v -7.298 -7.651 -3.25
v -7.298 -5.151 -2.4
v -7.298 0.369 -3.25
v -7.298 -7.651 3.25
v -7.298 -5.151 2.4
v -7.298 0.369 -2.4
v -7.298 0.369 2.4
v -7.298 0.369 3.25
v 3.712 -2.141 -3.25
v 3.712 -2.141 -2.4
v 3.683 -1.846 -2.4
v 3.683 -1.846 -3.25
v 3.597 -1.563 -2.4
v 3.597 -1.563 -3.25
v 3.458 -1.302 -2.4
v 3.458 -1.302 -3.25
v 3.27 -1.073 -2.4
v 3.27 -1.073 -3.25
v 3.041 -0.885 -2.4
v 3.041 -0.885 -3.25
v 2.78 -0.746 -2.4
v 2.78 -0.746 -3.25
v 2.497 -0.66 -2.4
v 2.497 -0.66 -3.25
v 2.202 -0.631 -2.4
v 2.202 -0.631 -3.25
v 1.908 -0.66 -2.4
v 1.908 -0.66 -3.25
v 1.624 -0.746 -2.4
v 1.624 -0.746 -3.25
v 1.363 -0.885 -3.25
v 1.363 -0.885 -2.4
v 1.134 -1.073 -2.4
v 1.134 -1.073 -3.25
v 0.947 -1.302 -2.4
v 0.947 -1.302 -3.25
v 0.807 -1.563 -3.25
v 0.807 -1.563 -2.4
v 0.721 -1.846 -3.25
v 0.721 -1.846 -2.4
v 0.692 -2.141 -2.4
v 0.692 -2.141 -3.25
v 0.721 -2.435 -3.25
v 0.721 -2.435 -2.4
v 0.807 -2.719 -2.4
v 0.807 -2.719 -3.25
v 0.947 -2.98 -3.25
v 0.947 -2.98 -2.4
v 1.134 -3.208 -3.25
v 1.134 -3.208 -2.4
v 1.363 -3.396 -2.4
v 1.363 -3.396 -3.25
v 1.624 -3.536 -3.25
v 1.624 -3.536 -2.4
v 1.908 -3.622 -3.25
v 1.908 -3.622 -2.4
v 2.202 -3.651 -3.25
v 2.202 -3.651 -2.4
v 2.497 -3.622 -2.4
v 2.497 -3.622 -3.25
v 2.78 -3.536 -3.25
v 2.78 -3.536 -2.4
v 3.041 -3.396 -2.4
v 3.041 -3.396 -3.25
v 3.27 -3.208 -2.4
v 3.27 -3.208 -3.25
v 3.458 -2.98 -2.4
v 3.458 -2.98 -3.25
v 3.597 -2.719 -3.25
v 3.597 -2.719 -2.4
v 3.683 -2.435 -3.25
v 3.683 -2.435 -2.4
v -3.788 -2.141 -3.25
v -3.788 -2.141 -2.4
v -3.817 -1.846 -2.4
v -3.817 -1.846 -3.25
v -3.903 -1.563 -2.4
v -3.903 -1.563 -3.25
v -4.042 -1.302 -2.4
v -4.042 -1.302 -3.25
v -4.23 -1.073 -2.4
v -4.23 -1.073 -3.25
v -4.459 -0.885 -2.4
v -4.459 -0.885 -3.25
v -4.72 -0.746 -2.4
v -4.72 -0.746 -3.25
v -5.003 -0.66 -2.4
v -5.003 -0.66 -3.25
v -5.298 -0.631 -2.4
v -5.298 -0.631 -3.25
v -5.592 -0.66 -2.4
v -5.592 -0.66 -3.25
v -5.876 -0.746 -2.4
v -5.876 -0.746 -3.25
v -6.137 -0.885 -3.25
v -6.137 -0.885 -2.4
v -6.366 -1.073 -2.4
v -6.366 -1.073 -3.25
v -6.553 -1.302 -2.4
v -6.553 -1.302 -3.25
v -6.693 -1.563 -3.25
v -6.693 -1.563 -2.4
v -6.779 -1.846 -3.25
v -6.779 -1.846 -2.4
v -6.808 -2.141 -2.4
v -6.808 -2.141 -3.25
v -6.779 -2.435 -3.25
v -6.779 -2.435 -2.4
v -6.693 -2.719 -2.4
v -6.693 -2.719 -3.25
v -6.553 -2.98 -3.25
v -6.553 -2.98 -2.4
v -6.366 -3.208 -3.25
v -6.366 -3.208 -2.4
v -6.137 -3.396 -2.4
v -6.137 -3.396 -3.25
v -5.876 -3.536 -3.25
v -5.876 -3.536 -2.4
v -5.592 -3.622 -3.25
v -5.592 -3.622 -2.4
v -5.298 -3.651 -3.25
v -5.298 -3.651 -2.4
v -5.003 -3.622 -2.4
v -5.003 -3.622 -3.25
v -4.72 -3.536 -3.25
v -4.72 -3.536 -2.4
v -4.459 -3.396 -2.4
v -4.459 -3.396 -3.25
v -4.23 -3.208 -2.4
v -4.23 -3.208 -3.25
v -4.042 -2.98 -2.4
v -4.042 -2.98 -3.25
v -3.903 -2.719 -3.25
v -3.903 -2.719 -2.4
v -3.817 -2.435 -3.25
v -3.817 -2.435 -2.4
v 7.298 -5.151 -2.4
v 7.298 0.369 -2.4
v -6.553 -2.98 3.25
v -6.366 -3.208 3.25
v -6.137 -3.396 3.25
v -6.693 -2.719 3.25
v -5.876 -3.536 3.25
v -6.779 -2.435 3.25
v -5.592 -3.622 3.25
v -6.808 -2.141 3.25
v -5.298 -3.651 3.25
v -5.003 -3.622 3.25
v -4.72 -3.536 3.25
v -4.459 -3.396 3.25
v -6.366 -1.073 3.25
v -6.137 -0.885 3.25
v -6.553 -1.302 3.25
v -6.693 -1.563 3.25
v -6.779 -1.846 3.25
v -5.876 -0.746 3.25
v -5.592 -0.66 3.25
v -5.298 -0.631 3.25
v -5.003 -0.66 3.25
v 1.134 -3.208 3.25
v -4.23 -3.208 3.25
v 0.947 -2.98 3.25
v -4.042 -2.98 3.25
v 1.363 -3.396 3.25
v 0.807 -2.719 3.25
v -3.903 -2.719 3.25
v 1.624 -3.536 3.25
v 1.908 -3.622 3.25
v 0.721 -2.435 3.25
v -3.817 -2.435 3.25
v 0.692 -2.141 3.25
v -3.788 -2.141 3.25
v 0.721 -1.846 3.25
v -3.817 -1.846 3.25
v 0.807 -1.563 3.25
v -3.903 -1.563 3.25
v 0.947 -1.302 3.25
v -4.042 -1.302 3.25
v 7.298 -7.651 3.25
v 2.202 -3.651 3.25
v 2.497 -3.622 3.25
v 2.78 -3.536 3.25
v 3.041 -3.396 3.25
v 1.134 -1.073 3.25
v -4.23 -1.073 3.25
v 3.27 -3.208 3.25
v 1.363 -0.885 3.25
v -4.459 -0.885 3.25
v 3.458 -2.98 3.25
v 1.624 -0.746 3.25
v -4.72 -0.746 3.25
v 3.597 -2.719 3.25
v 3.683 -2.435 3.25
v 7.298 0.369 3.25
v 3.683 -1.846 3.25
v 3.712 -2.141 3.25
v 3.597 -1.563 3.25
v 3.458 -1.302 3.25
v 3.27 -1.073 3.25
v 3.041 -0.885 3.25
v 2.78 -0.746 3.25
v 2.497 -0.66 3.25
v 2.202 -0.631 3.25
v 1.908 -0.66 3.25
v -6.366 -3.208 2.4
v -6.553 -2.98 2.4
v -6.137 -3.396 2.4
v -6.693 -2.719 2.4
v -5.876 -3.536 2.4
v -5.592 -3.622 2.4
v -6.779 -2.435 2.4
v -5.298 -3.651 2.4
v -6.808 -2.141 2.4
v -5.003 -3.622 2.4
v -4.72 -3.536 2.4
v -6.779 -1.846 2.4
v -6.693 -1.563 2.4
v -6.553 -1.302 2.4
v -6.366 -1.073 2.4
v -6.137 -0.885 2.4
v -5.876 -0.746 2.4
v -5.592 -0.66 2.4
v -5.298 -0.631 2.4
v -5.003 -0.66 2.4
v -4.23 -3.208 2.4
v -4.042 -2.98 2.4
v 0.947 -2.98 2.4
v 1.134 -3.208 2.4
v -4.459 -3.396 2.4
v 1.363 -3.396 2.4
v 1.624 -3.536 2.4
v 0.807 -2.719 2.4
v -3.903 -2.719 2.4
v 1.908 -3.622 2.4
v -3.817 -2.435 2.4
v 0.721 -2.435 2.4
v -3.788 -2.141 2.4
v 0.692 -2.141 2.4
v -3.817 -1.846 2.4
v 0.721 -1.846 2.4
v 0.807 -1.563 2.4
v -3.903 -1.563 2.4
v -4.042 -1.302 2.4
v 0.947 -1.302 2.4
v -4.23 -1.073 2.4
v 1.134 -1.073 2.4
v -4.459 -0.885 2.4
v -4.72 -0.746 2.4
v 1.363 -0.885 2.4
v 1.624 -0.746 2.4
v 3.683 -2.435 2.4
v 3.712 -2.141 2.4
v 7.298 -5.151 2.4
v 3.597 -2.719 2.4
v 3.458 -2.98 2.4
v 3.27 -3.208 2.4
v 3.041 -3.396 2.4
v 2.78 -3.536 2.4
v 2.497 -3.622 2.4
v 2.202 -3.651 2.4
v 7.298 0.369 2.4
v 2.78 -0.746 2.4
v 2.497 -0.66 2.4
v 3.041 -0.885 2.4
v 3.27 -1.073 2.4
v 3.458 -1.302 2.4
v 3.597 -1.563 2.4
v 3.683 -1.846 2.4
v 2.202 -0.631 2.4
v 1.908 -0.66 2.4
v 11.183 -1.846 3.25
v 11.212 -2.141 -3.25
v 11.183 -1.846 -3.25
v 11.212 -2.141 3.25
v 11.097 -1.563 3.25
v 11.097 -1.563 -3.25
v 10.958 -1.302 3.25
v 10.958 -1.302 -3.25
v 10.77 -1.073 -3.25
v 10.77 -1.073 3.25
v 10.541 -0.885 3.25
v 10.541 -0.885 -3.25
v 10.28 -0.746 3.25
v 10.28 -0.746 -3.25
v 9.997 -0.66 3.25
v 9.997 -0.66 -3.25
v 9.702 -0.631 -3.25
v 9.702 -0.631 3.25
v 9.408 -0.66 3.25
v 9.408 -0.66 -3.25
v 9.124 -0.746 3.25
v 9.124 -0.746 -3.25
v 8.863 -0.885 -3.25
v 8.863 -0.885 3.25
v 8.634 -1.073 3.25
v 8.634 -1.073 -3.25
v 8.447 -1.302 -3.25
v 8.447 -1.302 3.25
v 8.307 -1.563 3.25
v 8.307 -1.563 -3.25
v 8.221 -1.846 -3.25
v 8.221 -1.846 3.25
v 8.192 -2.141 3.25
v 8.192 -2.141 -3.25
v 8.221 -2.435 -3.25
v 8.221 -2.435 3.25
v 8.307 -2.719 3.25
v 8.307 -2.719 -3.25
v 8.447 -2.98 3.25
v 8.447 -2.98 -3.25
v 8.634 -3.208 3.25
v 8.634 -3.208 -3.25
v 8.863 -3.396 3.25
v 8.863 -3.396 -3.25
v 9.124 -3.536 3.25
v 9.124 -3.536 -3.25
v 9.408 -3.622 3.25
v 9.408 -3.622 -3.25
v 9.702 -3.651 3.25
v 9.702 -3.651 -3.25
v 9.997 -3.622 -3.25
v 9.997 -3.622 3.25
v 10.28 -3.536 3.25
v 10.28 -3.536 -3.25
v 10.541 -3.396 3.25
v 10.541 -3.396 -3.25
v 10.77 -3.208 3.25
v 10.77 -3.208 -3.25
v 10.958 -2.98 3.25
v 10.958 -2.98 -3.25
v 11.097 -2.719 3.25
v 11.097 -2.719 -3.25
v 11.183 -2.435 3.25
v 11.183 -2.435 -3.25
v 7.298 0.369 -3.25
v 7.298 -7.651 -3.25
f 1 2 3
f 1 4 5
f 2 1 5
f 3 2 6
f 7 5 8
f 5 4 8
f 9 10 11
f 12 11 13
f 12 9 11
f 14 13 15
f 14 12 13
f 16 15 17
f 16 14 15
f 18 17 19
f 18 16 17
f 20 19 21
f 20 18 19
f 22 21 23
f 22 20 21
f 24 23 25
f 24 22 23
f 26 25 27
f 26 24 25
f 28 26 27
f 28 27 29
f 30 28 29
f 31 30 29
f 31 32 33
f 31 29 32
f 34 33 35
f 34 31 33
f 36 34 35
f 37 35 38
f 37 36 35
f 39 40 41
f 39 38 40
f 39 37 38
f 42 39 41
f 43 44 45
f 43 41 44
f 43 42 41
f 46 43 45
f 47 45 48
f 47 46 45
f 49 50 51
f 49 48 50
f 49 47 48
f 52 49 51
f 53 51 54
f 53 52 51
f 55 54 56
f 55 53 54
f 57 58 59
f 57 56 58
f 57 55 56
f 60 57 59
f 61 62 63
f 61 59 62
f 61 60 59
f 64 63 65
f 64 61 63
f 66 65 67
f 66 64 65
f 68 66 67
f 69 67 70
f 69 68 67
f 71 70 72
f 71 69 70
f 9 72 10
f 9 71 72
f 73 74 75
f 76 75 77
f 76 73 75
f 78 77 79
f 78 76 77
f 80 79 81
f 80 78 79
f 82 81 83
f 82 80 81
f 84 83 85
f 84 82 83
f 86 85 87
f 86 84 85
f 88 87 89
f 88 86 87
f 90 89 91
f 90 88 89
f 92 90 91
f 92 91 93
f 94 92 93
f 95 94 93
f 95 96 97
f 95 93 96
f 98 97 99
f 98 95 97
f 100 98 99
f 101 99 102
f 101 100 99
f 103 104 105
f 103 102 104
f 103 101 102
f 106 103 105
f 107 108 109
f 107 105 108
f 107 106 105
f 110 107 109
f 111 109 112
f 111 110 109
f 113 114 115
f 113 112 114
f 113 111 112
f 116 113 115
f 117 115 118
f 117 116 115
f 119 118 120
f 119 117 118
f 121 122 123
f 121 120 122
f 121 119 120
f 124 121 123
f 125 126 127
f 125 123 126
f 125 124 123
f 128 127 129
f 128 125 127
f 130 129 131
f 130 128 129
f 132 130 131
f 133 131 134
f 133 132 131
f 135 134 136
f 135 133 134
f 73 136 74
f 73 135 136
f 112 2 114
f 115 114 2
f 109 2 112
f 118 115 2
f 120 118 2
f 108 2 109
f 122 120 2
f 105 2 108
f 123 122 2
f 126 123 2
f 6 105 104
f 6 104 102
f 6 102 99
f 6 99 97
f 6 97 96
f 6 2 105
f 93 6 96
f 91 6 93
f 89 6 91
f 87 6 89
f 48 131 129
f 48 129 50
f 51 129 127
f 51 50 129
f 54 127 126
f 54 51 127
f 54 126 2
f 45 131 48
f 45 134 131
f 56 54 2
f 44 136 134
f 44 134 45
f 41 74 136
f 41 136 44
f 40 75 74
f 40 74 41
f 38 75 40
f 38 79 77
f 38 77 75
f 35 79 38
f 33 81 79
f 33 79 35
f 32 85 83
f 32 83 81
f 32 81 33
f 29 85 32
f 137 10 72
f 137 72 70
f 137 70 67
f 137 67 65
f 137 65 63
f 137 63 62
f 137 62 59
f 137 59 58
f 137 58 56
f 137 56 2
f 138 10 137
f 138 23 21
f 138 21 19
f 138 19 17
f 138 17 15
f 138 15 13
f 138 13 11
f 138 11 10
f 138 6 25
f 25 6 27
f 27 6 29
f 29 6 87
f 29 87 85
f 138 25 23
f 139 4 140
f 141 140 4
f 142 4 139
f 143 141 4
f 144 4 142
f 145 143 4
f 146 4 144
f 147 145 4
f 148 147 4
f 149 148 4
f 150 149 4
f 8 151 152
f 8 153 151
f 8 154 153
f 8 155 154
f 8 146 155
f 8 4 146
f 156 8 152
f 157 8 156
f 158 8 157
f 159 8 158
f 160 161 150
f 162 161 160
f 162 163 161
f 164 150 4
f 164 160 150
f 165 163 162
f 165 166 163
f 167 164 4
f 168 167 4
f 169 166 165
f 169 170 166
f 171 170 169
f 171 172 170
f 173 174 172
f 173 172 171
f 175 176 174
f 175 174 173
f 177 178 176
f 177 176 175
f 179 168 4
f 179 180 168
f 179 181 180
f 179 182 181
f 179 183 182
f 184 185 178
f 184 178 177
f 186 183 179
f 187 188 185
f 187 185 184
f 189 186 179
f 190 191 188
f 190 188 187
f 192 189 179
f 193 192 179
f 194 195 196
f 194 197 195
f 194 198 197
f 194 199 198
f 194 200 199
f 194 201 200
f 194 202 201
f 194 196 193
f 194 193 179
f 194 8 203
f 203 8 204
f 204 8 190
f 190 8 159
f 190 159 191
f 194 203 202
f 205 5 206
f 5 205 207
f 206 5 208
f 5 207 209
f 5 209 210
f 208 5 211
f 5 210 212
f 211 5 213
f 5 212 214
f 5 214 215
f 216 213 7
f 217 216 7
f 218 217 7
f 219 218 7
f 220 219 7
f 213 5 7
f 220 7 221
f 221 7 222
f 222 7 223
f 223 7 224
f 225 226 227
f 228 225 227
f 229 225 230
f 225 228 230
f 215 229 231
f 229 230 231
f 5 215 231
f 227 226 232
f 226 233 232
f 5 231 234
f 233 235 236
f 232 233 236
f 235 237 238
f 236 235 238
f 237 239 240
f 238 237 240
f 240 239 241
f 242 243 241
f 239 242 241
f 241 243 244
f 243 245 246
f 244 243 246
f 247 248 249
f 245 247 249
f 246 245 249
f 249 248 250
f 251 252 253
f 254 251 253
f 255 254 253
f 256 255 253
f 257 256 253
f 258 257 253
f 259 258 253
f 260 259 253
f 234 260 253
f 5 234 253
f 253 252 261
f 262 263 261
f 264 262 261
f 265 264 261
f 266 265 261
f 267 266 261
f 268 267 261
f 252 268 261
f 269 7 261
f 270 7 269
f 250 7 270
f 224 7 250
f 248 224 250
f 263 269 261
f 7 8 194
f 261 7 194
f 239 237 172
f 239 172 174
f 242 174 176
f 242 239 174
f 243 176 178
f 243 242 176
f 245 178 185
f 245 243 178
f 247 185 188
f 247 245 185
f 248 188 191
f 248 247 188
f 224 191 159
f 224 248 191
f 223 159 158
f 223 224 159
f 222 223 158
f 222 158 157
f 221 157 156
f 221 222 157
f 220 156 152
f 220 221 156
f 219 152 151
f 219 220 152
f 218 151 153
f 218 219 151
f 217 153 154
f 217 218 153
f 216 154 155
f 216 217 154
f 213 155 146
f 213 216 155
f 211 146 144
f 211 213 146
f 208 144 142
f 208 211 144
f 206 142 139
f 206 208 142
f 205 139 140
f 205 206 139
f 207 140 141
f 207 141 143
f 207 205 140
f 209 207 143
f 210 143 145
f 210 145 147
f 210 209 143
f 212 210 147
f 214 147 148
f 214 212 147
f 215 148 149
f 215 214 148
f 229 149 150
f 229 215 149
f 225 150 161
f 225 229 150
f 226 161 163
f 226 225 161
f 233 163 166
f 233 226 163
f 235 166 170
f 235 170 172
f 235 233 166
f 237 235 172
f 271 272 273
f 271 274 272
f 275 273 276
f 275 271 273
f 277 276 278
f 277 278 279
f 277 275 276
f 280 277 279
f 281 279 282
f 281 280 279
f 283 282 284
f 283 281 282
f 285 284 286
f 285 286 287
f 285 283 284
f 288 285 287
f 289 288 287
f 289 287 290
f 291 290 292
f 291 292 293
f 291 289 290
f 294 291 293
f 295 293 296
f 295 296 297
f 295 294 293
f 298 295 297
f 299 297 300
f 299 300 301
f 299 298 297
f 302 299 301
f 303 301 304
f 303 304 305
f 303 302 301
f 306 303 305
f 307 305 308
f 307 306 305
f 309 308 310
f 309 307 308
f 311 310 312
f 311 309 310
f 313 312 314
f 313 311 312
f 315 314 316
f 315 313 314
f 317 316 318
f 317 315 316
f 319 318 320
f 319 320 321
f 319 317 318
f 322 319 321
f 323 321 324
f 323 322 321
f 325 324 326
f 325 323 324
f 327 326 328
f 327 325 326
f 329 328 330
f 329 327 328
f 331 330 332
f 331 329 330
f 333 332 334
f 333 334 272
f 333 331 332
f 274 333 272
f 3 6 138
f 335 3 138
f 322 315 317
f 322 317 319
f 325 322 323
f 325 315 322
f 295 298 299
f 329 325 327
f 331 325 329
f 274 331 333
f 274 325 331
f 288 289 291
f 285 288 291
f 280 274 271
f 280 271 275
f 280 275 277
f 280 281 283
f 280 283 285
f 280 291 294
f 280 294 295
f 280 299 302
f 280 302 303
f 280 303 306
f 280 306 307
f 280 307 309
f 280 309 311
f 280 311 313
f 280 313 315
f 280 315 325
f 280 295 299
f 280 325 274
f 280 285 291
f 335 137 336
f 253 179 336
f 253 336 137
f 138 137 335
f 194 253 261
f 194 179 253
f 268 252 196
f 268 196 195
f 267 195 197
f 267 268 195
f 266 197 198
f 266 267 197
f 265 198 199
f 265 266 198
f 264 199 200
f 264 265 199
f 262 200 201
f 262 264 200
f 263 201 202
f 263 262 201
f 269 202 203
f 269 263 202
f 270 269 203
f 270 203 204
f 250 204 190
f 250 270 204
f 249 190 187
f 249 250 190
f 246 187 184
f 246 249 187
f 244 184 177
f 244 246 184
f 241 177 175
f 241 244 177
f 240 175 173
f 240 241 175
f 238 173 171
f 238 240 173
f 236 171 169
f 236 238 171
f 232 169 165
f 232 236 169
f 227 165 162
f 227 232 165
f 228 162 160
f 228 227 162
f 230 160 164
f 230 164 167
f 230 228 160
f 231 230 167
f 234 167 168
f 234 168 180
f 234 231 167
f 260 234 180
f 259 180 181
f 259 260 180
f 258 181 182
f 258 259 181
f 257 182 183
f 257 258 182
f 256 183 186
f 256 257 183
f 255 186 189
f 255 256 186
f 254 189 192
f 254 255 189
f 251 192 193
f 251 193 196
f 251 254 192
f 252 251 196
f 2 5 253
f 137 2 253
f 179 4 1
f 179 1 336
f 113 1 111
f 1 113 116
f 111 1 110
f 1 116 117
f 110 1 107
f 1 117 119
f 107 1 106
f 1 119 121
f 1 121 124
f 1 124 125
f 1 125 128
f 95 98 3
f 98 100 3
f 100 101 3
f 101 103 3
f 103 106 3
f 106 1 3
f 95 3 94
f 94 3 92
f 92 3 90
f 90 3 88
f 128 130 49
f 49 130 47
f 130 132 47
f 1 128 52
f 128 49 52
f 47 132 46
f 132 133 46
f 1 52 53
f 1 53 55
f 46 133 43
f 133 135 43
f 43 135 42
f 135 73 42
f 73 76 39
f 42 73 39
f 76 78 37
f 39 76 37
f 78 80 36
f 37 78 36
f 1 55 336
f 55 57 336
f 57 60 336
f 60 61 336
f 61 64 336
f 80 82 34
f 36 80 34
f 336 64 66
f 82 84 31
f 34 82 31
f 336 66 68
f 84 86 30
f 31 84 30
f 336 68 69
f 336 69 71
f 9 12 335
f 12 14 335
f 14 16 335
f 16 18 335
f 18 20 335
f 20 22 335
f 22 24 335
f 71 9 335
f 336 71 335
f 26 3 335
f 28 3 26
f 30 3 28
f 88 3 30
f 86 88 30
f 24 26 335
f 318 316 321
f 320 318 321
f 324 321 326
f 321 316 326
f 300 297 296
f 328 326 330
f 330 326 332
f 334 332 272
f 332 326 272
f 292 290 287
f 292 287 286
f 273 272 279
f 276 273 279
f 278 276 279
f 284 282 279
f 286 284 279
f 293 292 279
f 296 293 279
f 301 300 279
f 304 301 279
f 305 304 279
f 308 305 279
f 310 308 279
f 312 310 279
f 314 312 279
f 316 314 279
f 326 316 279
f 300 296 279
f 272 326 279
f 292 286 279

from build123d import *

# Parameters (mm, degrees)
SKETCH2_R             = 1.51
BOSS_EXTRUDE2_DEPTH   = 3.25
SKETCH2_W             = 14.59562339
SKETCH2_H             = 8.02
BOSS_EXTRUDE2_2_DEPTH = 3.25
SKETCH3_W             = 14.59562339
SKETCH3_H             = 5.52
CUT_EXTRUDE4_DEPTH    = 2.4


with BuildPart() as part:
    # Sketch2 → Boss-Extrude2 (new body, symmetric)
    with BuildSketch(Plane.XY):
        with Locations((9.702188305, -2.140747254)):
            Circle(SKETCH2_R)
    extrude(amount=BOSS_EXTRUDE2_DEPTH, both=True)


with BuildPart() as body_2:
    # Sketch2 → Boss-Extrude2 2 (new body, symmetric)
    with BuildSketch(Plane.XY):
        with Locations((0, -3.640747254)):
            Rectangle(SKETCH2_W, SKETCH2_H)
        with Locations((-5.297811695, -2.140747254)):
            Circle(SKETCH2_R, mode=Mode.SUBTRACT)
        with Locations((2.202188305, -2.140747254)):
            Circle(SKETCH2_R, mode=Mode.SUBTRACT)
    extrude(amount=BOSS_EXTRUDE2_2_DEPTH, both=True)

    # Sketch3 → Cut-Extrude4 (cut, symmetric)
    with BuildSketch(Plane.XY):
        with Locations((0, -2.390747254)):
            Rectangle(SKETCH3_W, SKETCH3_H)
    extrude(amount=CUT_EXTRUDE4_DEPTH, both=True, mode=Mode.SUBTRACT)


solid = Compound([part.part, body_2.part])
